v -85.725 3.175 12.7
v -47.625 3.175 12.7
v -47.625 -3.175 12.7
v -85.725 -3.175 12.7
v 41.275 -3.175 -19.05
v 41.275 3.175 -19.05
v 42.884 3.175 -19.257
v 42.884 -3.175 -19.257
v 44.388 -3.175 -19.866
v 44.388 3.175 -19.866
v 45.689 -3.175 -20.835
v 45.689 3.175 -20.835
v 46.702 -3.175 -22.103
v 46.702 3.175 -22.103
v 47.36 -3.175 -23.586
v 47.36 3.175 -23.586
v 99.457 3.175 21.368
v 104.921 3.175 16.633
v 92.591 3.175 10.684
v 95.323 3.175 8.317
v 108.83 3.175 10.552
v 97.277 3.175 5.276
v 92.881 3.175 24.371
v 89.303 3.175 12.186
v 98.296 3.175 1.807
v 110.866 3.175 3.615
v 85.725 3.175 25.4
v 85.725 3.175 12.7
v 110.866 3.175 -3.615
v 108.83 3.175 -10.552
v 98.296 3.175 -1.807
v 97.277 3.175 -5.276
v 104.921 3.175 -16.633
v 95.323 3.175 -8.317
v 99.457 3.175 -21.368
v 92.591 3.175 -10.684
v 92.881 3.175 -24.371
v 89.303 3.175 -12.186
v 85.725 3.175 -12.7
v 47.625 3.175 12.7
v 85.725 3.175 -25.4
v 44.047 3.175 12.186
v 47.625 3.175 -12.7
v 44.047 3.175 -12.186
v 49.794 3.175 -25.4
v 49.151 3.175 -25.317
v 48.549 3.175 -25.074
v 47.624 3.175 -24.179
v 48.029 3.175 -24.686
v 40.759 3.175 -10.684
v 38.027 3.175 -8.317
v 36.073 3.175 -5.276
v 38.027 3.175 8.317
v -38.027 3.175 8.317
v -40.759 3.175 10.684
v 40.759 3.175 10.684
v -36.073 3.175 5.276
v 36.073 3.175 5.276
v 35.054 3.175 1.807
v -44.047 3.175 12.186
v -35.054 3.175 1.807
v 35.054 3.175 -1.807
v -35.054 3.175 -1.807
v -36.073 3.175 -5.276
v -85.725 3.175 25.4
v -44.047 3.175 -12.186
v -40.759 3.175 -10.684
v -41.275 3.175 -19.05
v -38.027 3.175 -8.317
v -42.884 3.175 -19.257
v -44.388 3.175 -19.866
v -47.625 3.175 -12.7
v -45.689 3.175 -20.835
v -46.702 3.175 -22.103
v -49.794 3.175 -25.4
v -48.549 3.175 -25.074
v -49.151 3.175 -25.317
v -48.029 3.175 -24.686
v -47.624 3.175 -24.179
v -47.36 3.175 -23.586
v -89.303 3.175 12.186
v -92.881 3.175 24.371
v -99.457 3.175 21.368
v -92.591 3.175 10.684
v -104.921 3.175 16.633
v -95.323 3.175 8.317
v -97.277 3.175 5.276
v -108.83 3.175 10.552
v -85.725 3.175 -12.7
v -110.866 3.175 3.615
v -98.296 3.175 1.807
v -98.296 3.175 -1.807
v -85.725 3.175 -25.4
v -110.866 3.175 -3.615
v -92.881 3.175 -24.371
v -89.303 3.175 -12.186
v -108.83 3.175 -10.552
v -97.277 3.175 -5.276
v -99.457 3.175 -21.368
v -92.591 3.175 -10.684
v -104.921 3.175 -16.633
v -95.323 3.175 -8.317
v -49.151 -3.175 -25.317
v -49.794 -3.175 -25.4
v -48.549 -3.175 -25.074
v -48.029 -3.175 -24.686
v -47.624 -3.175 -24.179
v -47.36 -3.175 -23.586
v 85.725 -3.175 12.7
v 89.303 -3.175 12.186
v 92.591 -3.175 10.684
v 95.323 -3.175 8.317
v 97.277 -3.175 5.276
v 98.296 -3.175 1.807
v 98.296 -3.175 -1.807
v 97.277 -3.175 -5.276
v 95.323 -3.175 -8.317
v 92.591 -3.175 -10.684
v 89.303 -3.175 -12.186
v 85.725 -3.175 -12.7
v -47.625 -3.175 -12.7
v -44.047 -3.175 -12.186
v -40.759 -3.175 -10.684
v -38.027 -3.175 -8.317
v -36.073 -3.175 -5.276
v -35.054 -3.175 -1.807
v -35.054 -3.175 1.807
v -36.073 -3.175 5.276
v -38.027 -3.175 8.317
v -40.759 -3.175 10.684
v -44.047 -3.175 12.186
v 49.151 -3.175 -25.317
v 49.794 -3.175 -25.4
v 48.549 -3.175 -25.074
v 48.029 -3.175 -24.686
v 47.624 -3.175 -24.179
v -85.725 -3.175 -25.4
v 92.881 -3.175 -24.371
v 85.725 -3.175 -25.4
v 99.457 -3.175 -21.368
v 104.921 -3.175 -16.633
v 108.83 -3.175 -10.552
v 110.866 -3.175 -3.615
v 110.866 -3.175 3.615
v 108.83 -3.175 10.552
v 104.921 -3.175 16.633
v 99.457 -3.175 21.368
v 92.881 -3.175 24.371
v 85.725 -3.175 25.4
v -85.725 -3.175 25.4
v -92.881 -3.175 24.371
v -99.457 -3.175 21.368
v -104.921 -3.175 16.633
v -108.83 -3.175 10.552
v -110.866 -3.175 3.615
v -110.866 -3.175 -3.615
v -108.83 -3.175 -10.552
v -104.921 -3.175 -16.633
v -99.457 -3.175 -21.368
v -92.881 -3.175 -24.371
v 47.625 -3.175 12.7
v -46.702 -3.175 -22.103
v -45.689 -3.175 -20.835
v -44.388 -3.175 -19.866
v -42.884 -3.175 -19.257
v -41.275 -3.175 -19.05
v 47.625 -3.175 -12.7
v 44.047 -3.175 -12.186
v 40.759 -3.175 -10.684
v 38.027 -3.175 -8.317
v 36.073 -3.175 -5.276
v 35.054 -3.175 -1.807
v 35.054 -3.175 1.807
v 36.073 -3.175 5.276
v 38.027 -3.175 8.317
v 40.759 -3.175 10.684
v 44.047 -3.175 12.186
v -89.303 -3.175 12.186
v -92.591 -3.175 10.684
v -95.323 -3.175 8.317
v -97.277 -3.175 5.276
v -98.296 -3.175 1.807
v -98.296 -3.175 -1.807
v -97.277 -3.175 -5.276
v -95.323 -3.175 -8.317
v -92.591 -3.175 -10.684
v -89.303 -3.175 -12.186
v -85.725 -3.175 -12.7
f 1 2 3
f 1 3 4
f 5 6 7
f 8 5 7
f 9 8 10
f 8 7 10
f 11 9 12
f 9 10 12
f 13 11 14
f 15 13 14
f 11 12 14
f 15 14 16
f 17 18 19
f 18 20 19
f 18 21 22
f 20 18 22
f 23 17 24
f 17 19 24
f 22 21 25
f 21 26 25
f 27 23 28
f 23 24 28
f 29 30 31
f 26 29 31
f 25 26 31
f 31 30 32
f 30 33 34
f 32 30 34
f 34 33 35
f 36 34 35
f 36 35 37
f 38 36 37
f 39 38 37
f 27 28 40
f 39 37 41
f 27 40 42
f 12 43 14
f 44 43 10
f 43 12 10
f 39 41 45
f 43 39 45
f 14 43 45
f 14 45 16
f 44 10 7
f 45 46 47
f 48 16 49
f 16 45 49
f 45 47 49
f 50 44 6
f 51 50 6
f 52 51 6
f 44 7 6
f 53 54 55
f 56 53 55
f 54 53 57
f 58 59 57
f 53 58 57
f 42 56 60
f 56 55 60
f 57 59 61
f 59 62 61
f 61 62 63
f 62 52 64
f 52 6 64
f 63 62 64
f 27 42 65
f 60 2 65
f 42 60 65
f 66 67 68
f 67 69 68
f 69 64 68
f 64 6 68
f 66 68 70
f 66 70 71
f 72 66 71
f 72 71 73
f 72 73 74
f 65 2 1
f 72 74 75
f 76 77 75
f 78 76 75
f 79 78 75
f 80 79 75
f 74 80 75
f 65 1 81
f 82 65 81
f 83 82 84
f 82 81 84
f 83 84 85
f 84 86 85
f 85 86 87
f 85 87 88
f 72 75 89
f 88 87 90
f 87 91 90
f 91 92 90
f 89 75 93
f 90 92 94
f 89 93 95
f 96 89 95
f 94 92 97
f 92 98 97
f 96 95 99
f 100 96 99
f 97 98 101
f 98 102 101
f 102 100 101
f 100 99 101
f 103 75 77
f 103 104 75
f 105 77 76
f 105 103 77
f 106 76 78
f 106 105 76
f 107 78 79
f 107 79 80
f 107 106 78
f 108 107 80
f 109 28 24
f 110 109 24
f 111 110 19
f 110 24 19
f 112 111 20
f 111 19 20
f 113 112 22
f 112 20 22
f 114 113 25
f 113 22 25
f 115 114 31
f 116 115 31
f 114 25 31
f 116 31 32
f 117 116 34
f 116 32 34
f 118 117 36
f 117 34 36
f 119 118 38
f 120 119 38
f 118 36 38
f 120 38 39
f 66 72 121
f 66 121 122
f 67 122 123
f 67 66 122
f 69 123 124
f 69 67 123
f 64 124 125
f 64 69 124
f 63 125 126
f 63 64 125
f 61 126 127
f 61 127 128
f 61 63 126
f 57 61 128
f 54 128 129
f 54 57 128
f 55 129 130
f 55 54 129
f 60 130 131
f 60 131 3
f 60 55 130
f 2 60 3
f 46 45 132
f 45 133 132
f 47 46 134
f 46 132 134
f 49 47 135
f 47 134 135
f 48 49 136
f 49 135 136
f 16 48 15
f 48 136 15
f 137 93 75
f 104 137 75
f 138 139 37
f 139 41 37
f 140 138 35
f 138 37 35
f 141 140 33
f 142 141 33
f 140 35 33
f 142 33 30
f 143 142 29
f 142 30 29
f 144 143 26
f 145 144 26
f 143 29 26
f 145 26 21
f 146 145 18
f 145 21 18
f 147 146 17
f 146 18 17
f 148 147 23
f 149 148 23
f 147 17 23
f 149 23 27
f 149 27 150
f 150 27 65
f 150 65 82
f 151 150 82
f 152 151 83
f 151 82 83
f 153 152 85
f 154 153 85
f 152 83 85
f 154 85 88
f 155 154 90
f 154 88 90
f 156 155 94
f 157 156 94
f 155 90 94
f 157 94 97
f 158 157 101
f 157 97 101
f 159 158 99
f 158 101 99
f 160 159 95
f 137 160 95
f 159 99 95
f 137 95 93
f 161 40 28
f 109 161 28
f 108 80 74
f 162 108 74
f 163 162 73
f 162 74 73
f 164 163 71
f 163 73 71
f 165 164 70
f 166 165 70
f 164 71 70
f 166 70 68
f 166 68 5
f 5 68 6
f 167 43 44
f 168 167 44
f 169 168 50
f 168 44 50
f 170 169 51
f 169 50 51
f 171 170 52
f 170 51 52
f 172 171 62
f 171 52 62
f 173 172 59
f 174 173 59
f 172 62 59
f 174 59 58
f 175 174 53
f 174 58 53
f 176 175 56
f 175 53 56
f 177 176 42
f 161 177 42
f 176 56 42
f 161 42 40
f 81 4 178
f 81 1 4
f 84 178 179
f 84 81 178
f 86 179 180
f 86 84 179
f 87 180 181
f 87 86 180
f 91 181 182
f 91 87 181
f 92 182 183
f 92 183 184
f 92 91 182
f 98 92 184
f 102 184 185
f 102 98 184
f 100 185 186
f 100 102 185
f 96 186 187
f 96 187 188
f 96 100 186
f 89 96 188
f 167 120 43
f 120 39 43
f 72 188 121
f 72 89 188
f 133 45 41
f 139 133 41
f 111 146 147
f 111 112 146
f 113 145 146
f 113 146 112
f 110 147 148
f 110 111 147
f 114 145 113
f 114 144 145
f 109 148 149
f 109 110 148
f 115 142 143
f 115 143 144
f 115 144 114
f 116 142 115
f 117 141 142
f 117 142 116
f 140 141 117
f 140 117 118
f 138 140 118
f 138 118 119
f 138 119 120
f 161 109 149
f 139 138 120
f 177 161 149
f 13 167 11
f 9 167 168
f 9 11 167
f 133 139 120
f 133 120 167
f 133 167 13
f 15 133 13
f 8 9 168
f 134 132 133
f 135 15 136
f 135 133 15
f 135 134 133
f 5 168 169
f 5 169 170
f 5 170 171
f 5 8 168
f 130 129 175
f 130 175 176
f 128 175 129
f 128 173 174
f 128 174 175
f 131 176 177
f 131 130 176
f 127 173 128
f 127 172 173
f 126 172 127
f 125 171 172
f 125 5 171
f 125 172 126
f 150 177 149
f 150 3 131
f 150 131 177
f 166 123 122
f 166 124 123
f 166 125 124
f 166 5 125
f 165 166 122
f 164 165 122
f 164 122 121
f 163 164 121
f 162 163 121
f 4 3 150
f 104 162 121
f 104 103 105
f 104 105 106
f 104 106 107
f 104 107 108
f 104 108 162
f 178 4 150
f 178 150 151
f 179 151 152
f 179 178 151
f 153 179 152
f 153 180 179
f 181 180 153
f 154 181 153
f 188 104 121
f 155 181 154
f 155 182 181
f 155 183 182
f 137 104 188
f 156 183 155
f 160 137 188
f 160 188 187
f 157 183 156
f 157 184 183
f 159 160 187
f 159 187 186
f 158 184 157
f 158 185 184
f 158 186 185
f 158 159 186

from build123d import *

# Parameters (mm, degrees)
BOSS_EXTRUDE1_DEPTH = 3.175
CUT_EXTRUDE1_DEPTH  = 7.35
FILLET1_R           = 2.54


with BuildPart() as part:
    # Sketch1 → Boss-Extrude1 (new body, symmetric)
    with BuildSketch(Plane(origin=(0, 0, 0), x_dir=(1, 0, 0), z_dir=(0, 1, 0))):
        with BuildLine():
            Line((-85.725, 25.4), (85.725, 25.4))
            ThreePointArc((85.725, 25.4), (111.125, 0), (85.725, -25.4))
            Line((85.725, -25.4), (-85.725, -25.4))
            ThreePointArc((-85.725, -25.4), (-111.125, 0), (-85.725, 25.4))
        make_face()
        with BuildLine():
            Line((-85.725, 12.7), (-47.625, 12.7))
            ThreePointArc((-47.625, 12.7), (-34.925, 0), (-47.625, -12.7))
            Line((-47.625, -12.7), (-85.725, -12.7))
            ThreePointArc((-85.725, -12.7), (-98.425, 0), (-85.725, 12.7))
        make_face(mode=Mode.SUBTRACT)
        with BuildLine():
            Line((85.725, 12.7), (47.625, 12.7))
            ThreePointArc((47.625, 12.7), (34.925, 0), (47.625, -12.7))
            Line((47.625, -12.7), (85.725, -12.7))
            ThreePointArc((85.725, -12.7), (98.425, 0), (85.725, 12.7))
        make_face(mode=Mode.SUBTRACT)
    extrude(amount=BOSS_EXTRUDE1_DEPTH, both=True)

    # Sketch2 → Cut-Extrude1 (cut, through all)
    with BuildSketch(Plane(origin=(0, 3.175, 0), x_dir=(1, 0, 0), z_dir=(0, 1, 0))):
        with BuildLine():
            Line((-41.275, 19.05), (41.275, 19.05))
            ThreePointArc((41.275, 19.05), (45.765128061, 20.909871939), (47.625, 25.4))
            Line((47.625, 25.4), (-47.625, 25.4))
            ThreePointArc((-47.625, 25.4), (-45.765128061, 20.909871939), (-41.275, 19.05))
        make_face()
    extrude(amount=-CUT_EXTRUDE1_DEPTH, mode=Mode.SUBTRACT)

    # Fillet1
    fillet1_edges = [part.edges().sort_by_distance(p)[0] for p in [
        (-47.625, 0, -25.4),
        (47.625, 0, -25.4),
    ]]
    fillet(fillet1_edges, radius=FILLET1_R)


solid = part.part
